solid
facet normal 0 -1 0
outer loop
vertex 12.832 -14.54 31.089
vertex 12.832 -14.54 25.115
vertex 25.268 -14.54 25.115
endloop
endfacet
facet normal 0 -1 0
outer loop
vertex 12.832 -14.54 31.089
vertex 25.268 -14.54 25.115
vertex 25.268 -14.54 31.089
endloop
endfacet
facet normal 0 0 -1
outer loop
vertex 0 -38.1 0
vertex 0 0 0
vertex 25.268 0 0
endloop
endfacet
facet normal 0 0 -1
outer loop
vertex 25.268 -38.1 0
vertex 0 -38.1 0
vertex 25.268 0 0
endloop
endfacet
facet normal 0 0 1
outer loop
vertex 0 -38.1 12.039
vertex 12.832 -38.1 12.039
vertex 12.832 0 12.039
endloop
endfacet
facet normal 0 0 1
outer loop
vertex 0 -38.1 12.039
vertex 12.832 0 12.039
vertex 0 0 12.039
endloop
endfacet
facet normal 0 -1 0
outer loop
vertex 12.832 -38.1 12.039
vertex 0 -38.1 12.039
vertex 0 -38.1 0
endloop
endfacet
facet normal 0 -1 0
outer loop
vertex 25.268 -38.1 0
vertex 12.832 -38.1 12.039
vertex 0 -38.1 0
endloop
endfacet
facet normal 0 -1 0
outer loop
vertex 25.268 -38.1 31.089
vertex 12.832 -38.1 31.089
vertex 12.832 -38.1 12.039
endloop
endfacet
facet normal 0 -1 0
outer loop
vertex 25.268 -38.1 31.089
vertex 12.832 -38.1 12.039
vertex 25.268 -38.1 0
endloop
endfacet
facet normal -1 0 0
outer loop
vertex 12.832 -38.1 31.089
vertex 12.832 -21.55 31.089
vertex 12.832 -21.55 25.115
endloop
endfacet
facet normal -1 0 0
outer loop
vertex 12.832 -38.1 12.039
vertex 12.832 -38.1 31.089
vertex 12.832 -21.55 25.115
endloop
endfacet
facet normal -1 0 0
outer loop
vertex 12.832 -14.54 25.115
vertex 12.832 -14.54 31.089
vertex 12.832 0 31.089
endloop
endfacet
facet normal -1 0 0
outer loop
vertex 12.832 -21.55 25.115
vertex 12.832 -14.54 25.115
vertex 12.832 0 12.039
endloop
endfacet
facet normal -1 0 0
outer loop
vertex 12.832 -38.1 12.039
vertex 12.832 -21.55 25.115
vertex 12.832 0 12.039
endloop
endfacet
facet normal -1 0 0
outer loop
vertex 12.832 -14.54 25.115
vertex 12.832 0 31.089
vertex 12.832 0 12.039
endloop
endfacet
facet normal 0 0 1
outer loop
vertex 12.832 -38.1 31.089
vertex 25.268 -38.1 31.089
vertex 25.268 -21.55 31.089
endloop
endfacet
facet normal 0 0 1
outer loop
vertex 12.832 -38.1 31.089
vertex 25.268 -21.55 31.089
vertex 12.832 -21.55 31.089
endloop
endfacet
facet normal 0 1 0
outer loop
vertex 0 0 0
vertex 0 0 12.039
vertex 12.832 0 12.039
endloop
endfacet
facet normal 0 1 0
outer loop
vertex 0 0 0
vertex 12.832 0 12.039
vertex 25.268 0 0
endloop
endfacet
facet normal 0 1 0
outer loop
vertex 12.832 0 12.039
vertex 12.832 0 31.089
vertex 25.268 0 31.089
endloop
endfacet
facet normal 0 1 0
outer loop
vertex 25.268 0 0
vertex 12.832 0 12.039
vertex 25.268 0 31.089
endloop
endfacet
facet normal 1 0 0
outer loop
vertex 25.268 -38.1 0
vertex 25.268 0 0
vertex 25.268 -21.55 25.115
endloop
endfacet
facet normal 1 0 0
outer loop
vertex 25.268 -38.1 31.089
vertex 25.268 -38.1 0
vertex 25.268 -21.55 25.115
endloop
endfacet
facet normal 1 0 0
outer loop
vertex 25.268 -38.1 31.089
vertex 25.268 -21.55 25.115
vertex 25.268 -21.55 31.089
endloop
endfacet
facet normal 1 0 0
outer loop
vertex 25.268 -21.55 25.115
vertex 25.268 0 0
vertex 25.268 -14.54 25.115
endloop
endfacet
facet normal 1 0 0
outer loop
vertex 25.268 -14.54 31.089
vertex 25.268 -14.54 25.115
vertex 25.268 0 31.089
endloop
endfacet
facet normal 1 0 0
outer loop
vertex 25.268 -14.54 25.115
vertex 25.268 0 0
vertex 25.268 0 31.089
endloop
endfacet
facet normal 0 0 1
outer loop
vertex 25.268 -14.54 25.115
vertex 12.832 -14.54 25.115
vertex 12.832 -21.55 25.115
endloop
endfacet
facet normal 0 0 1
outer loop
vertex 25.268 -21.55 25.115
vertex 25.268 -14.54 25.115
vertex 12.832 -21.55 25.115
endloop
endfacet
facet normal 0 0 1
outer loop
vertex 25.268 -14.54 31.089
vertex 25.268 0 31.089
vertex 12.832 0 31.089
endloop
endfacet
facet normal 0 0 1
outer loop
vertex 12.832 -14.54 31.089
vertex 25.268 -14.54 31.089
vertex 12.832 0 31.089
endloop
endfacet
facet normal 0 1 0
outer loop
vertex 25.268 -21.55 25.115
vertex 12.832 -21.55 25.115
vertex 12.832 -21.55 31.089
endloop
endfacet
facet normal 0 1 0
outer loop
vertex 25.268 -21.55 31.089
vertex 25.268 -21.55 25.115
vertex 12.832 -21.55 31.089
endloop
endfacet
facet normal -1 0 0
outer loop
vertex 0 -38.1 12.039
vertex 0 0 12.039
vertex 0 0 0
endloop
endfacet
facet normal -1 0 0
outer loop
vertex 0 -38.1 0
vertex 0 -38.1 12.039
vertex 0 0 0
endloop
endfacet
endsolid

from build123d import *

# Parameters (mm, degrees)
F1_DEPTH = 38.1
F3_DEPTH = 12.7
F4_W     = 7.010136731
F4_H     = 5.9738913878
F5_DEPTH = 12.7


with BuildPart() as f1:
    # F0 (on Front) → F1 (new body)
    with BuildSketch(Plane.XZ):
        Polygon((0, 12.0385394319), (0, 0), (25.2677070918, 0), (25.2677070918, 31.0885394319), (12.8322897299, 31.0885394319), (12.8322897299, 12.0385394319), align=None)
    extrude(amount=F1_DEPTH)

    # F2 (on Right) → F3 (cut)
    with BuildSketch(Plane.YZ):
        Polygon((-12.249593623, 22.1733152866), (-12.249593623, 30.8565702289), (-24.6542412788, 31.1666876078), (-24.6542412788, 22.1733152866), align=None)
    extrude(amount=-F3_DEPTH, mode=Mode.SUBTRACT)

    # F4 (on face) → F5 (cut)
    with BuildSketch(Plane(origin=(12.8322897299, 0, 0), x_dir=(0, -1, 0), z_dir=(-1, 0, 0))):
        with Locations((18.044912722, 28.101593738)):
            Rectangle(F4_W, F4_H)
    extrude(amount=-F5_DEPTH, mode=Mode.SUBTRACT)


solid = f1.part
